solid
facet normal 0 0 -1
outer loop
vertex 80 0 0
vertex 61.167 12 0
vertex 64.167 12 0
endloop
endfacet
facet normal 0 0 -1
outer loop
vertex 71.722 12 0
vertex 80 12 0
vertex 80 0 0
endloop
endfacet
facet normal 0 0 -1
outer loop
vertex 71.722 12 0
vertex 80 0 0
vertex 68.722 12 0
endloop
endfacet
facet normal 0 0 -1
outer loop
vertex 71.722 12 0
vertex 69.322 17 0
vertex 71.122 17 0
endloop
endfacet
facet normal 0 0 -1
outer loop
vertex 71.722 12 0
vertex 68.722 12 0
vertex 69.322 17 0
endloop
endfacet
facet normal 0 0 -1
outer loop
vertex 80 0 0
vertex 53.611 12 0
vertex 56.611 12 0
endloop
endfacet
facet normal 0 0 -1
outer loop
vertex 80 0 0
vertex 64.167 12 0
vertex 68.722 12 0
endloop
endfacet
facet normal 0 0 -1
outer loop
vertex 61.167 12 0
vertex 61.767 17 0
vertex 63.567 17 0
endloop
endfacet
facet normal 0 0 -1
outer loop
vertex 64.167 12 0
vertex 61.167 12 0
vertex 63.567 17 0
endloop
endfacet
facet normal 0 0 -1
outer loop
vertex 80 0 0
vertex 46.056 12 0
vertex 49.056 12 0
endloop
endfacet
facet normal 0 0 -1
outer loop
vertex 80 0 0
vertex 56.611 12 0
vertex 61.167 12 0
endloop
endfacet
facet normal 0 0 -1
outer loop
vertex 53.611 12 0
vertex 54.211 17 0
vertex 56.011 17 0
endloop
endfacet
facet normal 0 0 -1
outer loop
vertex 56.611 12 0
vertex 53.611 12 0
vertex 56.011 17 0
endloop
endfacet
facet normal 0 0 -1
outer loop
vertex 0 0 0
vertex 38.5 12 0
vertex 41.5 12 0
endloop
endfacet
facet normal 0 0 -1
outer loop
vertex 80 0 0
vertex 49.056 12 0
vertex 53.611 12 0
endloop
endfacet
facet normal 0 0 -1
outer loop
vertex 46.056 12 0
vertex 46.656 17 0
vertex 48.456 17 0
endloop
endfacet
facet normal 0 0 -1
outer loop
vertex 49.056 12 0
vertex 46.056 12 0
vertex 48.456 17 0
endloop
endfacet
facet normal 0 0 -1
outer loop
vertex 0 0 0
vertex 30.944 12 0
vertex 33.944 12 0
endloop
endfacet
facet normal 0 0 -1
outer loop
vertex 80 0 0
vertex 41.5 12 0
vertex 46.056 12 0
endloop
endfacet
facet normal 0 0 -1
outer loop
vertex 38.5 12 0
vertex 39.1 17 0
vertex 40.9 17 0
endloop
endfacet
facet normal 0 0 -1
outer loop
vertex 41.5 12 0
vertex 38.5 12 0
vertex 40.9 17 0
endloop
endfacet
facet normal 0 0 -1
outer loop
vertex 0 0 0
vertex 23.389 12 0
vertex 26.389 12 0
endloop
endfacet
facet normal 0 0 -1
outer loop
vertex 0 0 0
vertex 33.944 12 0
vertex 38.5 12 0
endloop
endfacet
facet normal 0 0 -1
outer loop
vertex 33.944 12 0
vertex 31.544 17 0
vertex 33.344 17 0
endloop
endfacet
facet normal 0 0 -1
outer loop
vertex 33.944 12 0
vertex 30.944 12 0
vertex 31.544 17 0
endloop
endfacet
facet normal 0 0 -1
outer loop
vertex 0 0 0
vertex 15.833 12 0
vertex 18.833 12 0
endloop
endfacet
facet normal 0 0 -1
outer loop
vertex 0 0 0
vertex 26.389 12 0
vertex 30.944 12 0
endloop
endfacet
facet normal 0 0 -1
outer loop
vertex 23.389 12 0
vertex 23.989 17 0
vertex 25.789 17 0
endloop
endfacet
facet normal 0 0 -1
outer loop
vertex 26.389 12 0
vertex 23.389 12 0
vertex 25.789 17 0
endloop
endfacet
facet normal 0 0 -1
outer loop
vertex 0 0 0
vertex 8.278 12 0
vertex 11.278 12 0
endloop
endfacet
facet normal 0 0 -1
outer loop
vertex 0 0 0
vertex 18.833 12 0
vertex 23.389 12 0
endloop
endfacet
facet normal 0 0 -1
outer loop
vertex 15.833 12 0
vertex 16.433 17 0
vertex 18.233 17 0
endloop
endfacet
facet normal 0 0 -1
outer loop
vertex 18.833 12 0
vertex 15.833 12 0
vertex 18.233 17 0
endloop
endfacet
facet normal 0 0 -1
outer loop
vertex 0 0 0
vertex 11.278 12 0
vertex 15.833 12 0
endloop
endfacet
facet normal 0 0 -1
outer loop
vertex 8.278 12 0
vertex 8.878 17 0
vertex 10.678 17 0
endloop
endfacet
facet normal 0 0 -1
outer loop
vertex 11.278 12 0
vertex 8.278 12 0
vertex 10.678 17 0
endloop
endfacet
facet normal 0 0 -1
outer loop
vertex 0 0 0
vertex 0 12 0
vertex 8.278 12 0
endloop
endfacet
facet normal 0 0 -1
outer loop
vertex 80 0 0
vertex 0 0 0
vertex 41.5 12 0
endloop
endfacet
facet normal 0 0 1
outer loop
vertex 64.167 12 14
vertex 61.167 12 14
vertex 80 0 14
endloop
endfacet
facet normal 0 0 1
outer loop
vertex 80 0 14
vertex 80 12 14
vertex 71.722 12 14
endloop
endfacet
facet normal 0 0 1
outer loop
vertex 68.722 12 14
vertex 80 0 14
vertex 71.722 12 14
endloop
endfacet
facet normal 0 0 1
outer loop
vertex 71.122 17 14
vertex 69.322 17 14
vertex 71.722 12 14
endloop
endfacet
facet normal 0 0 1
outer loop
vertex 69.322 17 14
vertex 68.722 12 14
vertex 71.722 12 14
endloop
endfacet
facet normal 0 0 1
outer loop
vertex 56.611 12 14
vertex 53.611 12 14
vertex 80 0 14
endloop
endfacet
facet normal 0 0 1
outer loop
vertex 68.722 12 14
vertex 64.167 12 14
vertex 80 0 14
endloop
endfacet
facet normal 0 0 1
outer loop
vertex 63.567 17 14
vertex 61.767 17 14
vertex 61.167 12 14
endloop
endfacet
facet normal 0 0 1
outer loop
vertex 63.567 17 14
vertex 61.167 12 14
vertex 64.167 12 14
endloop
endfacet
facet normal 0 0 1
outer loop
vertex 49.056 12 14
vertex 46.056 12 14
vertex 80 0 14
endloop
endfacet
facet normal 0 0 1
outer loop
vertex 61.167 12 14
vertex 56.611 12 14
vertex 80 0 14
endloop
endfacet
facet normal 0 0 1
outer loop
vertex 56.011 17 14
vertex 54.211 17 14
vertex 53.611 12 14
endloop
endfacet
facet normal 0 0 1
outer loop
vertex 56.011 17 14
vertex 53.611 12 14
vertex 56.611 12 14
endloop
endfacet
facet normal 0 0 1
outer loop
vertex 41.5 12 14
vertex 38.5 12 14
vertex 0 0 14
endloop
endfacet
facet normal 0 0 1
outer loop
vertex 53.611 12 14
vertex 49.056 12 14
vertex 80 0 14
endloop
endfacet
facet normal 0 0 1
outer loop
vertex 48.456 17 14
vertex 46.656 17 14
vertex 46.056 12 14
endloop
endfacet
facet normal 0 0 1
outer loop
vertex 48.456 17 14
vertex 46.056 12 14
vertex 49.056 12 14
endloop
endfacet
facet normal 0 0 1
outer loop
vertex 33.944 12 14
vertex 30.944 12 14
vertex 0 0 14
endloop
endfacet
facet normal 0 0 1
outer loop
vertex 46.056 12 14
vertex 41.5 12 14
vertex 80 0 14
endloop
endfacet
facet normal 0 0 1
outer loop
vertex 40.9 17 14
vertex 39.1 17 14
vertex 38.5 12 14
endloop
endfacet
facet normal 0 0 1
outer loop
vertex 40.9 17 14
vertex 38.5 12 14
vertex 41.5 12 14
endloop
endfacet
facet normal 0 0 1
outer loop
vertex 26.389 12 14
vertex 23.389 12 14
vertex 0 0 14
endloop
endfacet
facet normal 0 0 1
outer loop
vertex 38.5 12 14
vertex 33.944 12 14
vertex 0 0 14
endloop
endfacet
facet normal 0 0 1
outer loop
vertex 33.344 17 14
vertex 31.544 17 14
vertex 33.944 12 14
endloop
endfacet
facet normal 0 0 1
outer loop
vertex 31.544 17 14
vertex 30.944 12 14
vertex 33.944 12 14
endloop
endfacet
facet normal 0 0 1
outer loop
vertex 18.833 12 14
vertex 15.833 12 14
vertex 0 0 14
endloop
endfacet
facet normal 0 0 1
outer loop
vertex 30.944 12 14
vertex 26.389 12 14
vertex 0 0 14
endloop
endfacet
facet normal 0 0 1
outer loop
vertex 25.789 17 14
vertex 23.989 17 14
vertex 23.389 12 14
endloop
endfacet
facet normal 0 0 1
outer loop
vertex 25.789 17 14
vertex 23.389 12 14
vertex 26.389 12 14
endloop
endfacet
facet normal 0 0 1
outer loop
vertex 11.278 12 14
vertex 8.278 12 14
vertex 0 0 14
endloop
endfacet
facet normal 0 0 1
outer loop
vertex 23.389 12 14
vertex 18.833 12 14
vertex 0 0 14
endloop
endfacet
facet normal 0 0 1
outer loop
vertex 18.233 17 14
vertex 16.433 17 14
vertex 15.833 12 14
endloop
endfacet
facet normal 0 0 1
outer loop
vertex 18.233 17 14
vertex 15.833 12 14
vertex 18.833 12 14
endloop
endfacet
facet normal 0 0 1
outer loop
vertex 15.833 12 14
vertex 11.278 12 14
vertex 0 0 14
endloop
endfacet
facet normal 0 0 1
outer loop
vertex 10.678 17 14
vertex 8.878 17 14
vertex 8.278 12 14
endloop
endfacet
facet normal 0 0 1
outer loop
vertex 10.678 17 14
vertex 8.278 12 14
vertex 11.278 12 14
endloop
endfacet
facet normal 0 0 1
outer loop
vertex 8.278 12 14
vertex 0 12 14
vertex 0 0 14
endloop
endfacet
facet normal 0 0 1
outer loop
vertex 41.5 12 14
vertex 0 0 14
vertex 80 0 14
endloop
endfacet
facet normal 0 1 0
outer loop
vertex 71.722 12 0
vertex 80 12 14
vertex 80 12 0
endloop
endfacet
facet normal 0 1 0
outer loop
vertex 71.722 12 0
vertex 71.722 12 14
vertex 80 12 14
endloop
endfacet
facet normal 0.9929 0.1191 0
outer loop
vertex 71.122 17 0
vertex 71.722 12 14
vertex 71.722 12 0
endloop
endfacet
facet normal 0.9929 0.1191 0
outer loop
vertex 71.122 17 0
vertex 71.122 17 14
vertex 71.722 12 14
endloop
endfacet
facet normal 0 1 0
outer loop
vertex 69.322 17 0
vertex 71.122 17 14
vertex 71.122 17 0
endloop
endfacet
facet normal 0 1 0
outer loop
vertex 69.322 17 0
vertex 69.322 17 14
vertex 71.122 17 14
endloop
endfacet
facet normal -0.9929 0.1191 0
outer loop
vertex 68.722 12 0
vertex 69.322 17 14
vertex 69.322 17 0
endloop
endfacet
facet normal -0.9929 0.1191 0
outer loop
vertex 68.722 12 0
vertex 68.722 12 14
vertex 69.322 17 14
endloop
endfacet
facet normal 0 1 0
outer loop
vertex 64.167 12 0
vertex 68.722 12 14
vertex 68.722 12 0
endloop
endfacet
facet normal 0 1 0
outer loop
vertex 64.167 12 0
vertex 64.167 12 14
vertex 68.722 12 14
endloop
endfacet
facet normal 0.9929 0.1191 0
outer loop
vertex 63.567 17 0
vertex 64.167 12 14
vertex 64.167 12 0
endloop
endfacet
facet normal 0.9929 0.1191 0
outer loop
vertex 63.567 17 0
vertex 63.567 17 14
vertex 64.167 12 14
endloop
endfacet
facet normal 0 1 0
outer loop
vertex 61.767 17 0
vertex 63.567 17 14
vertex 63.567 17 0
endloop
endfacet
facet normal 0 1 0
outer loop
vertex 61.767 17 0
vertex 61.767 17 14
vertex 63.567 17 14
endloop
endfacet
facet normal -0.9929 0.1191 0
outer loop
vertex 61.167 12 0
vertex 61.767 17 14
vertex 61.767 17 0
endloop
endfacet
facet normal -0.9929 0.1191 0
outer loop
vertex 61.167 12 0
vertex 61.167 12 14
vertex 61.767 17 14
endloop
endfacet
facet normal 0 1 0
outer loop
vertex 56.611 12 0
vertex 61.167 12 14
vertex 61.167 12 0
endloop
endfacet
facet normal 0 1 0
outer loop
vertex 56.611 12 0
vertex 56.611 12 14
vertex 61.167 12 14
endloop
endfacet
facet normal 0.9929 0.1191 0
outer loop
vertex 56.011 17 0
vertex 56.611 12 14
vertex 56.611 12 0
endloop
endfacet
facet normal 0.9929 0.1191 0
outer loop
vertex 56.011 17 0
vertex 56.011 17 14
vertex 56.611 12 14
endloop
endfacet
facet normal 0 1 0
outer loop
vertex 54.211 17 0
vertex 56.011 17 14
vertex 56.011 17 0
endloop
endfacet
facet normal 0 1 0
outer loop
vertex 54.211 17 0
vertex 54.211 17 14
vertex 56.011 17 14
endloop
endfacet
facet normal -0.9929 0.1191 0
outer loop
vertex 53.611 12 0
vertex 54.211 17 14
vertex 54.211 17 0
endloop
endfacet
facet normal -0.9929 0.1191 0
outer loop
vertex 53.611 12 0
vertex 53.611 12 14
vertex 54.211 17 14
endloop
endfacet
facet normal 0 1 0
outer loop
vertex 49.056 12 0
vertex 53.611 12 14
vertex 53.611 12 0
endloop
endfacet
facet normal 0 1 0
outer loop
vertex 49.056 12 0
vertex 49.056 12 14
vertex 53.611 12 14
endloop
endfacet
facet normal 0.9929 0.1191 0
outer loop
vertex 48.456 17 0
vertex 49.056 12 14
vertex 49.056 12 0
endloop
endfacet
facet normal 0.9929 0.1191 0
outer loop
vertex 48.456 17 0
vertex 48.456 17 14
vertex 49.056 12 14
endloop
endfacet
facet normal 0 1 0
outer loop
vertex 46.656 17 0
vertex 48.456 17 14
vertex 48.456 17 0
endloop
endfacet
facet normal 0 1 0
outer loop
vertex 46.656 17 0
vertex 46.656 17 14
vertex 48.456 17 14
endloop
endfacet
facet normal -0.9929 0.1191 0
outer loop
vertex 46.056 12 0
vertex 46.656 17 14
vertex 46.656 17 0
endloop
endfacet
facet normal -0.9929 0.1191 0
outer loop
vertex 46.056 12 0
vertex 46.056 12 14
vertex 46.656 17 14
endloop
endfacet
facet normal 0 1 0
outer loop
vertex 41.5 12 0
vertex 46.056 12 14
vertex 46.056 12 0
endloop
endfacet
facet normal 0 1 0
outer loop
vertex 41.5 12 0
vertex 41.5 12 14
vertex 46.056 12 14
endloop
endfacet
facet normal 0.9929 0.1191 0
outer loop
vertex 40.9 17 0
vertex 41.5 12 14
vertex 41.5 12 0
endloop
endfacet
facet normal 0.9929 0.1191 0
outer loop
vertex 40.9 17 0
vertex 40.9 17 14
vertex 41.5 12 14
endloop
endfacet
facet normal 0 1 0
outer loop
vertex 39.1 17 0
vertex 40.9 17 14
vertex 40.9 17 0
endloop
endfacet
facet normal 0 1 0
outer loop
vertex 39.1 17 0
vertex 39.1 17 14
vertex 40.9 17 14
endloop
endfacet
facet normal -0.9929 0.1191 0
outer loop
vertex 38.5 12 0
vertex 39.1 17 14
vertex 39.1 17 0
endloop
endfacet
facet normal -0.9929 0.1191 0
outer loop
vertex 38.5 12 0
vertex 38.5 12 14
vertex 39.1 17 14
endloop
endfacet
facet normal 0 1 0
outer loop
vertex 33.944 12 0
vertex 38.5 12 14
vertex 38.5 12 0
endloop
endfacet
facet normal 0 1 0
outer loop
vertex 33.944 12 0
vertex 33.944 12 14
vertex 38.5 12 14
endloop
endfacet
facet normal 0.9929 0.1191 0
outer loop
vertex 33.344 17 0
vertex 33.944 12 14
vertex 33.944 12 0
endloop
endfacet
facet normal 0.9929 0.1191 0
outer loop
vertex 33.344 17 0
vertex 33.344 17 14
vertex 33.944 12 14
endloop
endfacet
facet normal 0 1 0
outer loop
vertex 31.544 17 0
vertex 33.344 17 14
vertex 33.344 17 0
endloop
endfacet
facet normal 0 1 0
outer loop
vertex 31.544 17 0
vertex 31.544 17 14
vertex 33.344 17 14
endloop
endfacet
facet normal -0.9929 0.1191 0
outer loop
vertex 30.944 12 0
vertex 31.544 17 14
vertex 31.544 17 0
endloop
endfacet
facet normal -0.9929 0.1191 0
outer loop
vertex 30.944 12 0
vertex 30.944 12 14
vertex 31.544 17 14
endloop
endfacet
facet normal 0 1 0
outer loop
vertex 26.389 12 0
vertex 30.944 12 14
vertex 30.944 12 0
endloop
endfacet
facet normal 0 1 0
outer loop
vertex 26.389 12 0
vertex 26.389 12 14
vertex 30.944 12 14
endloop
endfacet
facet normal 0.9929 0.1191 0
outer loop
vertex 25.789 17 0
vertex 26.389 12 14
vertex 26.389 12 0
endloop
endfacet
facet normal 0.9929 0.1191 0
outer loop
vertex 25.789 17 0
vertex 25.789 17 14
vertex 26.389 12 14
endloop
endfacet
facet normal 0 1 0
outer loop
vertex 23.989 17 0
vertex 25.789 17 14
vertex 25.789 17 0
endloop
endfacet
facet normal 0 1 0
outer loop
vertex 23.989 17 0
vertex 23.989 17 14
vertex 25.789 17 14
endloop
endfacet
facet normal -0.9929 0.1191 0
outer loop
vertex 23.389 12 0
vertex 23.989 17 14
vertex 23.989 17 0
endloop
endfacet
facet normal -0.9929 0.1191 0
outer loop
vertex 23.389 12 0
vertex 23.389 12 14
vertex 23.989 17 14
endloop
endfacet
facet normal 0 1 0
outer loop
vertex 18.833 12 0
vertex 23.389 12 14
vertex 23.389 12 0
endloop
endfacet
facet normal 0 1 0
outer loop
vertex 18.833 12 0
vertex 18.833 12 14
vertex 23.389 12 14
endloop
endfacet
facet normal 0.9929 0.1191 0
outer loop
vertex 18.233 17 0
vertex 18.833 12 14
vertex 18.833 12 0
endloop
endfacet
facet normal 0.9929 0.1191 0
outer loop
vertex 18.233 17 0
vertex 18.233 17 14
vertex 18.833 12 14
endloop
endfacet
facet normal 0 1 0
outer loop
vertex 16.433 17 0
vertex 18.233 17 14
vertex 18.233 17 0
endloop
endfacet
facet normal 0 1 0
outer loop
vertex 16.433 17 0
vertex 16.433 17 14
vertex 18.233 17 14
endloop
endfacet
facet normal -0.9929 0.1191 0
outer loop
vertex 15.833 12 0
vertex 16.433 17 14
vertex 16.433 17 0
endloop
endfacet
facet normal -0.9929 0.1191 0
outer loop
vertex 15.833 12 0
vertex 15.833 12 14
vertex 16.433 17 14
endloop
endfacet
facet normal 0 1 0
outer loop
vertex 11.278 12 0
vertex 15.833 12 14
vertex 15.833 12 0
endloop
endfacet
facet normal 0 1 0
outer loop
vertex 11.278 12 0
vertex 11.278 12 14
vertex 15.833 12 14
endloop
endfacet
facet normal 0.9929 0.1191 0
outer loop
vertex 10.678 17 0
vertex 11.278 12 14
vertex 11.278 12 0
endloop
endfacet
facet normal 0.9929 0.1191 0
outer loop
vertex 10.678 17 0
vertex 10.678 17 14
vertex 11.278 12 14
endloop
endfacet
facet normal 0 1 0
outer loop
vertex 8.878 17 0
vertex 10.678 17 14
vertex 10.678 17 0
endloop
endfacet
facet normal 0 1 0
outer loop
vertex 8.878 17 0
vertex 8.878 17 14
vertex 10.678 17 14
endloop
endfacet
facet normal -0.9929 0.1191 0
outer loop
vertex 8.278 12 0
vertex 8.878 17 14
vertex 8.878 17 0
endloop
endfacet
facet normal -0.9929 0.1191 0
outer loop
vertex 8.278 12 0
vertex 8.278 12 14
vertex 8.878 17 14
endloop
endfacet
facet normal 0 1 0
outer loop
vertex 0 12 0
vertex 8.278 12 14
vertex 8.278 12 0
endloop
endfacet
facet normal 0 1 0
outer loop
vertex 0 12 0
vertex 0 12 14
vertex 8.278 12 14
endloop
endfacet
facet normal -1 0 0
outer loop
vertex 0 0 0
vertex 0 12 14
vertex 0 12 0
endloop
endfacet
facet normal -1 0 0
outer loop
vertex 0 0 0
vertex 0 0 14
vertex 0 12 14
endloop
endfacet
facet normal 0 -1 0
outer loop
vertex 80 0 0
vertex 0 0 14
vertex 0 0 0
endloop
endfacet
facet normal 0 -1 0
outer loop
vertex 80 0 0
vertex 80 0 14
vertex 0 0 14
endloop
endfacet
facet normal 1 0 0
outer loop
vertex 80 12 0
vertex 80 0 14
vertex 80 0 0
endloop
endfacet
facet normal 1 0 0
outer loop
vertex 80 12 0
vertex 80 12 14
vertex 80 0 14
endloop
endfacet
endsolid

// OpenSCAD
$fn = 32;

// ----------------------------------------------------------------------
// Gear rack: 9 teeth on a 80 mm bar, pitch 7.56 mm
// ----------------------------------------------------------------------

// --- parameters (mm) ---
profile_height = 14;      // extrusion height
profile_points = 40;      // points of the closed outline

profile = [[0, 0], [80, 0], [80, 12], [71.722, 12], [71.122, 17], [69.322, 17], [68.722, 12], [64.167, 12], [63.567, 17], [61.767, 17], [61.167, 12], [56.611, 12], [56.011, 17], [54.211, 17], [53.611, 12], [49.056, 12], [48.456, 17], [46.656, 17], [46.056, 12], [41.5, 12], [40.9, 17], [39.1, 17], [38.5, 12], [33.944, 12], [33.344, 17], [31.544, 17], [30.944, 12], [26.389, 12], [25.789, 17], [23.989, 17], [23.389, 12], [18.833, 12], [18.233, 17], [16.433, 17], [15.833, 12], [11.278, 12], [10.678, 17], [8.878, 17], [8.278, 12], [0, 12]];  // single closed polygon, 40 points, counter clockwise

// --- the one profile operation ---
linear_extrude(height = profile_height) polygon(points = profile);
